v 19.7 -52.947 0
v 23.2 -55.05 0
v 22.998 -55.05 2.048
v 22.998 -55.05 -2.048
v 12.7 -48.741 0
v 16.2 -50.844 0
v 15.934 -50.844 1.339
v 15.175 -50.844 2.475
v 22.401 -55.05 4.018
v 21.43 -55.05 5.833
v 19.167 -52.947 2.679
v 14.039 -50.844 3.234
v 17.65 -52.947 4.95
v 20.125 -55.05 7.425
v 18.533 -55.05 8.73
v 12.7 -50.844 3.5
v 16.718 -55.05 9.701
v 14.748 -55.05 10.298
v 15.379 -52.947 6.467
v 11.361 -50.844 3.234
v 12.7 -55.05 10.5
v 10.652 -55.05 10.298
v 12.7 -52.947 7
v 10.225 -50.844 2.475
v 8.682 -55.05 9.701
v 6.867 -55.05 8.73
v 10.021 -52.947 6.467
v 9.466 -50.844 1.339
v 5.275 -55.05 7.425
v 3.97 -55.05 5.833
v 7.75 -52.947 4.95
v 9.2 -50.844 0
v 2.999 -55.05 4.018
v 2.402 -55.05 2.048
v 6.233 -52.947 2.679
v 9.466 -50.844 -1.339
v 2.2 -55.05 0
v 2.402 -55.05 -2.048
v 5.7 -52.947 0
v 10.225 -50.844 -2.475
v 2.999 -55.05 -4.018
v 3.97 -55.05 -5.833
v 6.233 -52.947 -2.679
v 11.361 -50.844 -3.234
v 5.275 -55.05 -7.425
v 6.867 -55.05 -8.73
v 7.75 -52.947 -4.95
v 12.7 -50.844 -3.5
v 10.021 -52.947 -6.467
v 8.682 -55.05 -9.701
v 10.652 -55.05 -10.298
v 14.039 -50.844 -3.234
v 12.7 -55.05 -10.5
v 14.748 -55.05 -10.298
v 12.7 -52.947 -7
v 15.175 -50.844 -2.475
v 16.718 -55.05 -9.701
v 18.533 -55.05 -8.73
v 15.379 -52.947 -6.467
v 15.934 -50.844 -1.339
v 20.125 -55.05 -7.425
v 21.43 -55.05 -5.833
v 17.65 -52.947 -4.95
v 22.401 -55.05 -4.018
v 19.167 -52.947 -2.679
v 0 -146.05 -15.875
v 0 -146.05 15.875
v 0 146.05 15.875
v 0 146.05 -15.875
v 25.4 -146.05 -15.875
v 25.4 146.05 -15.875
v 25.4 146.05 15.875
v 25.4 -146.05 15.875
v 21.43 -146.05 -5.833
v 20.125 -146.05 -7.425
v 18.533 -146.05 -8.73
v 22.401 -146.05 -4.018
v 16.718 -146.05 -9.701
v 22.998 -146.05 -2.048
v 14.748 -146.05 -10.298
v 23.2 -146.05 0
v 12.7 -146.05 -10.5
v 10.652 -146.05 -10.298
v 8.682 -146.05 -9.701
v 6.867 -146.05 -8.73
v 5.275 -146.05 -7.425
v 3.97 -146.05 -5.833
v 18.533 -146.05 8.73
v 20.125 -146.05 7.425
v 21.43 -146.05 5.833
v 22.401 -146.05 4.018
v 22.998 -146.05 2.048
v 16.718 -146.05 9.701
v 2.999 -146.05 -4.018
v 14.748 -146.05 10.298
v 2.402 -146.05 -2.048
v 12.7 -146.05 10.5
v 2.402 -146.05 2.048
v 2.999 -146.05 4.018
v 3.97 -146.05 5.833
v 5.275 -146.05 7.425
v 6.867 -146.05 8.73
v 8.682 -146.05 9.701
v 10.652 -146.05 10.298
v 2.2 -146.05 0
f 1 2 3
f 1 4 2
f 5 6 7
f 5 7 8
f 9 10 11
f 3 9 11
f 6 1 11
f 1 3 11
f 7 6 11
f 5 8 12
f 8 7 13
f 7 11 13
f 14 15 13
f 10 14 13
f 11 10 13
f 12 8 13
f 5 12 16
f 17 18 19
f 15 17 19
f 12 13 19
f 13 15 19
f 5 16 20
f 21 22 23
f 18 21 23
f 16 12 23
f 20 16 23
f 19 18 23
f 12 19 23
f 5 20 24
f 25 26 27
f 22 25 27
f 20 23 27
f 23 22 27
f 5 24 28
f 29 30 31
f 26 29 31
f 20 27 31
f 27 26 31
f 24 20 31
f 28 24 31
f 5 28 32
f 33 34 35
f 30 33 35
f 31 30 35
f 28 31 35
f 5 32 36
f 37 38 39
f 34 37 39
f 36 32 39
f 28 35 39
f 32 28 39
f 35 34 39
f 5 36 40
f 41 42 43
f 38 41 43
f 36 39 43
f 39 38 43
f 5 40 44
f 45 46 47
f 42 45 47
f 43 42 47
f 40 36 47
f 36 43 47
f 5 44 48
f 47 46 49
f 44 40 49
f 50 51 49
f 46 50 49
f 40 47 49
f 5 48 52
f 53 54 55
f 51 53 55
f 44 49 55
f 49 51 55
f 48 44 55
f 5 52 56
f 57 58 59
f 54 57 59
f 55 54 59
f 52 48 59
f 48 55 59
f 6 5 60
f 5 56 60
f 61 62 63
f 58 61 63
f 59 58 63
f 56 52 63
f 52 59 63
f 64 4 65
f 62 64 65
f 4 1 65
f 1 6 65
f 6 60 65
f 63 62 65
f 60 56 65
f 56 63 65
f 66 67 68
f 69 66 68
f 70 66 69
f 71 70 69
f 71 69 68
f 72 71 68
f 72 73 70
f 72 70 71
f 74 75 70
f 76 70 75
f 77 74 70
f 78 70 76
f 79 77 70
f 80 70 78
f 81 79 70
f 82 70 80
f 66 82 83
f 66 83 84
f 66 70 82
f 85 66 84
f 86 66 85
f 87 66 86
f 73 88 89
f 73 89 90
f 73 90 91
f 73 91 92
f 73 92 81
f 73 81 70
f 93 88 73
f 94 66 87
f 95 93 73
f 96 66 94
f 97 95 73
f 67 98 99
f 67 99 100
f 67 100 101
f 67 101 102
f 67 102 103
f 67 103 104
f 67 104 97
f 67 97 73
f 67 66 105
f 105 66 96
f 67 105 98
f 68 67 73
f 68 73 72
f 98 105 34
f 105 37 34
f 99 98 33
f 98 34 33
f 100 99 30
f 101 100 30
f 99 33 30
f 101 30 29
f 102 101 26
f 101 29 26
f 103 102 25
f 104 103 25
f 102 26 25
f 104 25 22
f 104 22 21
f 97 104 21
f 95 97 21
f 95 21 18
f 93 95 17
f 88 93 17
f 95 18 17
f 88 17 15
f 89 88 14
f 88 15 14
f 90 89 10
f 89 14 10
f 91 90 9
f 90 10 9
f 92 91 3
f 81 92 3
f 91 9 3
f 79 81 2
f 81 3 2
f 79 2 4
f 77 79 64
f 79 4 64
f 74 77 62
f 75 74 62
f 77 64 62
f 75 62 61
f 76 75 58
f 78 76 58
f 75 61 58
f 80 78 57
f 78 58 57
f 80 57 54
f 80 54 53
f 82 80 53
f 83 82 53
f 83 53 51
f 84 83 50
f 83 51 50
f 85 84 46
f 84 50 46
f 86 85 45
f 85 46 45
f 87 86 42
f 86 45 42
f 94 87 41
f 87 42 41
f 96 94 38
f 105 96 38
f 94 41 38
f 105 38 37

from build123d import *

# Parameters (mm, degrees)
F0_W     = 292.1
F0_H     = 31.75
F1_DEPTH = 20.32
F2_DEPTH = 5.08
F3_DEPTH = 25.4
F4_DEPTH = 25.4
F6_D     = 21
F6_DEPTH = 91
F6_TIP   = 6.3090364998


with BuildPart() as f1:
    # F0 (on Right) → F1 (new body)
    with BuildSketch(Plane.YZ):
        Rectangle(F0_W, F0_H)
    extrude(amount=F1_DEPTH)

    # F2 (add): a face of the model
    f2_faces = [f1.faces().sort_by_distance(p)[0] for p in [
        (20.32, 0, 0),
    ]]
    extrude(f2_faces, amount=F2_DEPTH)

    # F3 (add): a face of the model
    f3_faces = [f1.faces().sort_by_distance(p)[0] for p in [
        (25.4, 0, 0),
    ]]
    extrude(f3_faces, amount=F3_DEPTH)

    # F4 (cut): a face of the model
    f4_faces = [f1.faces().sort_by_distance(p)[0] for p in [
        (50.8, 0, 0),
    ]]
    extrude(f4_faces, amount=-F4_DEPTH, mode=Mode.SUBTRACT)

    # F6
    with Locations(Plane.XZ.offset(146.05)):
        with Locations((12.7, 0)):
            Hole(F6_D / 2, depth=F6_DEPTH)
            with Locations((0, 0, -(F6_DEPTH + F6_TIP / 2))):  # 118° drill point
                Cone(0, F6_D / 2, F6_TIP, mode=Mode.SUBTRACT)


solid = f1.part
